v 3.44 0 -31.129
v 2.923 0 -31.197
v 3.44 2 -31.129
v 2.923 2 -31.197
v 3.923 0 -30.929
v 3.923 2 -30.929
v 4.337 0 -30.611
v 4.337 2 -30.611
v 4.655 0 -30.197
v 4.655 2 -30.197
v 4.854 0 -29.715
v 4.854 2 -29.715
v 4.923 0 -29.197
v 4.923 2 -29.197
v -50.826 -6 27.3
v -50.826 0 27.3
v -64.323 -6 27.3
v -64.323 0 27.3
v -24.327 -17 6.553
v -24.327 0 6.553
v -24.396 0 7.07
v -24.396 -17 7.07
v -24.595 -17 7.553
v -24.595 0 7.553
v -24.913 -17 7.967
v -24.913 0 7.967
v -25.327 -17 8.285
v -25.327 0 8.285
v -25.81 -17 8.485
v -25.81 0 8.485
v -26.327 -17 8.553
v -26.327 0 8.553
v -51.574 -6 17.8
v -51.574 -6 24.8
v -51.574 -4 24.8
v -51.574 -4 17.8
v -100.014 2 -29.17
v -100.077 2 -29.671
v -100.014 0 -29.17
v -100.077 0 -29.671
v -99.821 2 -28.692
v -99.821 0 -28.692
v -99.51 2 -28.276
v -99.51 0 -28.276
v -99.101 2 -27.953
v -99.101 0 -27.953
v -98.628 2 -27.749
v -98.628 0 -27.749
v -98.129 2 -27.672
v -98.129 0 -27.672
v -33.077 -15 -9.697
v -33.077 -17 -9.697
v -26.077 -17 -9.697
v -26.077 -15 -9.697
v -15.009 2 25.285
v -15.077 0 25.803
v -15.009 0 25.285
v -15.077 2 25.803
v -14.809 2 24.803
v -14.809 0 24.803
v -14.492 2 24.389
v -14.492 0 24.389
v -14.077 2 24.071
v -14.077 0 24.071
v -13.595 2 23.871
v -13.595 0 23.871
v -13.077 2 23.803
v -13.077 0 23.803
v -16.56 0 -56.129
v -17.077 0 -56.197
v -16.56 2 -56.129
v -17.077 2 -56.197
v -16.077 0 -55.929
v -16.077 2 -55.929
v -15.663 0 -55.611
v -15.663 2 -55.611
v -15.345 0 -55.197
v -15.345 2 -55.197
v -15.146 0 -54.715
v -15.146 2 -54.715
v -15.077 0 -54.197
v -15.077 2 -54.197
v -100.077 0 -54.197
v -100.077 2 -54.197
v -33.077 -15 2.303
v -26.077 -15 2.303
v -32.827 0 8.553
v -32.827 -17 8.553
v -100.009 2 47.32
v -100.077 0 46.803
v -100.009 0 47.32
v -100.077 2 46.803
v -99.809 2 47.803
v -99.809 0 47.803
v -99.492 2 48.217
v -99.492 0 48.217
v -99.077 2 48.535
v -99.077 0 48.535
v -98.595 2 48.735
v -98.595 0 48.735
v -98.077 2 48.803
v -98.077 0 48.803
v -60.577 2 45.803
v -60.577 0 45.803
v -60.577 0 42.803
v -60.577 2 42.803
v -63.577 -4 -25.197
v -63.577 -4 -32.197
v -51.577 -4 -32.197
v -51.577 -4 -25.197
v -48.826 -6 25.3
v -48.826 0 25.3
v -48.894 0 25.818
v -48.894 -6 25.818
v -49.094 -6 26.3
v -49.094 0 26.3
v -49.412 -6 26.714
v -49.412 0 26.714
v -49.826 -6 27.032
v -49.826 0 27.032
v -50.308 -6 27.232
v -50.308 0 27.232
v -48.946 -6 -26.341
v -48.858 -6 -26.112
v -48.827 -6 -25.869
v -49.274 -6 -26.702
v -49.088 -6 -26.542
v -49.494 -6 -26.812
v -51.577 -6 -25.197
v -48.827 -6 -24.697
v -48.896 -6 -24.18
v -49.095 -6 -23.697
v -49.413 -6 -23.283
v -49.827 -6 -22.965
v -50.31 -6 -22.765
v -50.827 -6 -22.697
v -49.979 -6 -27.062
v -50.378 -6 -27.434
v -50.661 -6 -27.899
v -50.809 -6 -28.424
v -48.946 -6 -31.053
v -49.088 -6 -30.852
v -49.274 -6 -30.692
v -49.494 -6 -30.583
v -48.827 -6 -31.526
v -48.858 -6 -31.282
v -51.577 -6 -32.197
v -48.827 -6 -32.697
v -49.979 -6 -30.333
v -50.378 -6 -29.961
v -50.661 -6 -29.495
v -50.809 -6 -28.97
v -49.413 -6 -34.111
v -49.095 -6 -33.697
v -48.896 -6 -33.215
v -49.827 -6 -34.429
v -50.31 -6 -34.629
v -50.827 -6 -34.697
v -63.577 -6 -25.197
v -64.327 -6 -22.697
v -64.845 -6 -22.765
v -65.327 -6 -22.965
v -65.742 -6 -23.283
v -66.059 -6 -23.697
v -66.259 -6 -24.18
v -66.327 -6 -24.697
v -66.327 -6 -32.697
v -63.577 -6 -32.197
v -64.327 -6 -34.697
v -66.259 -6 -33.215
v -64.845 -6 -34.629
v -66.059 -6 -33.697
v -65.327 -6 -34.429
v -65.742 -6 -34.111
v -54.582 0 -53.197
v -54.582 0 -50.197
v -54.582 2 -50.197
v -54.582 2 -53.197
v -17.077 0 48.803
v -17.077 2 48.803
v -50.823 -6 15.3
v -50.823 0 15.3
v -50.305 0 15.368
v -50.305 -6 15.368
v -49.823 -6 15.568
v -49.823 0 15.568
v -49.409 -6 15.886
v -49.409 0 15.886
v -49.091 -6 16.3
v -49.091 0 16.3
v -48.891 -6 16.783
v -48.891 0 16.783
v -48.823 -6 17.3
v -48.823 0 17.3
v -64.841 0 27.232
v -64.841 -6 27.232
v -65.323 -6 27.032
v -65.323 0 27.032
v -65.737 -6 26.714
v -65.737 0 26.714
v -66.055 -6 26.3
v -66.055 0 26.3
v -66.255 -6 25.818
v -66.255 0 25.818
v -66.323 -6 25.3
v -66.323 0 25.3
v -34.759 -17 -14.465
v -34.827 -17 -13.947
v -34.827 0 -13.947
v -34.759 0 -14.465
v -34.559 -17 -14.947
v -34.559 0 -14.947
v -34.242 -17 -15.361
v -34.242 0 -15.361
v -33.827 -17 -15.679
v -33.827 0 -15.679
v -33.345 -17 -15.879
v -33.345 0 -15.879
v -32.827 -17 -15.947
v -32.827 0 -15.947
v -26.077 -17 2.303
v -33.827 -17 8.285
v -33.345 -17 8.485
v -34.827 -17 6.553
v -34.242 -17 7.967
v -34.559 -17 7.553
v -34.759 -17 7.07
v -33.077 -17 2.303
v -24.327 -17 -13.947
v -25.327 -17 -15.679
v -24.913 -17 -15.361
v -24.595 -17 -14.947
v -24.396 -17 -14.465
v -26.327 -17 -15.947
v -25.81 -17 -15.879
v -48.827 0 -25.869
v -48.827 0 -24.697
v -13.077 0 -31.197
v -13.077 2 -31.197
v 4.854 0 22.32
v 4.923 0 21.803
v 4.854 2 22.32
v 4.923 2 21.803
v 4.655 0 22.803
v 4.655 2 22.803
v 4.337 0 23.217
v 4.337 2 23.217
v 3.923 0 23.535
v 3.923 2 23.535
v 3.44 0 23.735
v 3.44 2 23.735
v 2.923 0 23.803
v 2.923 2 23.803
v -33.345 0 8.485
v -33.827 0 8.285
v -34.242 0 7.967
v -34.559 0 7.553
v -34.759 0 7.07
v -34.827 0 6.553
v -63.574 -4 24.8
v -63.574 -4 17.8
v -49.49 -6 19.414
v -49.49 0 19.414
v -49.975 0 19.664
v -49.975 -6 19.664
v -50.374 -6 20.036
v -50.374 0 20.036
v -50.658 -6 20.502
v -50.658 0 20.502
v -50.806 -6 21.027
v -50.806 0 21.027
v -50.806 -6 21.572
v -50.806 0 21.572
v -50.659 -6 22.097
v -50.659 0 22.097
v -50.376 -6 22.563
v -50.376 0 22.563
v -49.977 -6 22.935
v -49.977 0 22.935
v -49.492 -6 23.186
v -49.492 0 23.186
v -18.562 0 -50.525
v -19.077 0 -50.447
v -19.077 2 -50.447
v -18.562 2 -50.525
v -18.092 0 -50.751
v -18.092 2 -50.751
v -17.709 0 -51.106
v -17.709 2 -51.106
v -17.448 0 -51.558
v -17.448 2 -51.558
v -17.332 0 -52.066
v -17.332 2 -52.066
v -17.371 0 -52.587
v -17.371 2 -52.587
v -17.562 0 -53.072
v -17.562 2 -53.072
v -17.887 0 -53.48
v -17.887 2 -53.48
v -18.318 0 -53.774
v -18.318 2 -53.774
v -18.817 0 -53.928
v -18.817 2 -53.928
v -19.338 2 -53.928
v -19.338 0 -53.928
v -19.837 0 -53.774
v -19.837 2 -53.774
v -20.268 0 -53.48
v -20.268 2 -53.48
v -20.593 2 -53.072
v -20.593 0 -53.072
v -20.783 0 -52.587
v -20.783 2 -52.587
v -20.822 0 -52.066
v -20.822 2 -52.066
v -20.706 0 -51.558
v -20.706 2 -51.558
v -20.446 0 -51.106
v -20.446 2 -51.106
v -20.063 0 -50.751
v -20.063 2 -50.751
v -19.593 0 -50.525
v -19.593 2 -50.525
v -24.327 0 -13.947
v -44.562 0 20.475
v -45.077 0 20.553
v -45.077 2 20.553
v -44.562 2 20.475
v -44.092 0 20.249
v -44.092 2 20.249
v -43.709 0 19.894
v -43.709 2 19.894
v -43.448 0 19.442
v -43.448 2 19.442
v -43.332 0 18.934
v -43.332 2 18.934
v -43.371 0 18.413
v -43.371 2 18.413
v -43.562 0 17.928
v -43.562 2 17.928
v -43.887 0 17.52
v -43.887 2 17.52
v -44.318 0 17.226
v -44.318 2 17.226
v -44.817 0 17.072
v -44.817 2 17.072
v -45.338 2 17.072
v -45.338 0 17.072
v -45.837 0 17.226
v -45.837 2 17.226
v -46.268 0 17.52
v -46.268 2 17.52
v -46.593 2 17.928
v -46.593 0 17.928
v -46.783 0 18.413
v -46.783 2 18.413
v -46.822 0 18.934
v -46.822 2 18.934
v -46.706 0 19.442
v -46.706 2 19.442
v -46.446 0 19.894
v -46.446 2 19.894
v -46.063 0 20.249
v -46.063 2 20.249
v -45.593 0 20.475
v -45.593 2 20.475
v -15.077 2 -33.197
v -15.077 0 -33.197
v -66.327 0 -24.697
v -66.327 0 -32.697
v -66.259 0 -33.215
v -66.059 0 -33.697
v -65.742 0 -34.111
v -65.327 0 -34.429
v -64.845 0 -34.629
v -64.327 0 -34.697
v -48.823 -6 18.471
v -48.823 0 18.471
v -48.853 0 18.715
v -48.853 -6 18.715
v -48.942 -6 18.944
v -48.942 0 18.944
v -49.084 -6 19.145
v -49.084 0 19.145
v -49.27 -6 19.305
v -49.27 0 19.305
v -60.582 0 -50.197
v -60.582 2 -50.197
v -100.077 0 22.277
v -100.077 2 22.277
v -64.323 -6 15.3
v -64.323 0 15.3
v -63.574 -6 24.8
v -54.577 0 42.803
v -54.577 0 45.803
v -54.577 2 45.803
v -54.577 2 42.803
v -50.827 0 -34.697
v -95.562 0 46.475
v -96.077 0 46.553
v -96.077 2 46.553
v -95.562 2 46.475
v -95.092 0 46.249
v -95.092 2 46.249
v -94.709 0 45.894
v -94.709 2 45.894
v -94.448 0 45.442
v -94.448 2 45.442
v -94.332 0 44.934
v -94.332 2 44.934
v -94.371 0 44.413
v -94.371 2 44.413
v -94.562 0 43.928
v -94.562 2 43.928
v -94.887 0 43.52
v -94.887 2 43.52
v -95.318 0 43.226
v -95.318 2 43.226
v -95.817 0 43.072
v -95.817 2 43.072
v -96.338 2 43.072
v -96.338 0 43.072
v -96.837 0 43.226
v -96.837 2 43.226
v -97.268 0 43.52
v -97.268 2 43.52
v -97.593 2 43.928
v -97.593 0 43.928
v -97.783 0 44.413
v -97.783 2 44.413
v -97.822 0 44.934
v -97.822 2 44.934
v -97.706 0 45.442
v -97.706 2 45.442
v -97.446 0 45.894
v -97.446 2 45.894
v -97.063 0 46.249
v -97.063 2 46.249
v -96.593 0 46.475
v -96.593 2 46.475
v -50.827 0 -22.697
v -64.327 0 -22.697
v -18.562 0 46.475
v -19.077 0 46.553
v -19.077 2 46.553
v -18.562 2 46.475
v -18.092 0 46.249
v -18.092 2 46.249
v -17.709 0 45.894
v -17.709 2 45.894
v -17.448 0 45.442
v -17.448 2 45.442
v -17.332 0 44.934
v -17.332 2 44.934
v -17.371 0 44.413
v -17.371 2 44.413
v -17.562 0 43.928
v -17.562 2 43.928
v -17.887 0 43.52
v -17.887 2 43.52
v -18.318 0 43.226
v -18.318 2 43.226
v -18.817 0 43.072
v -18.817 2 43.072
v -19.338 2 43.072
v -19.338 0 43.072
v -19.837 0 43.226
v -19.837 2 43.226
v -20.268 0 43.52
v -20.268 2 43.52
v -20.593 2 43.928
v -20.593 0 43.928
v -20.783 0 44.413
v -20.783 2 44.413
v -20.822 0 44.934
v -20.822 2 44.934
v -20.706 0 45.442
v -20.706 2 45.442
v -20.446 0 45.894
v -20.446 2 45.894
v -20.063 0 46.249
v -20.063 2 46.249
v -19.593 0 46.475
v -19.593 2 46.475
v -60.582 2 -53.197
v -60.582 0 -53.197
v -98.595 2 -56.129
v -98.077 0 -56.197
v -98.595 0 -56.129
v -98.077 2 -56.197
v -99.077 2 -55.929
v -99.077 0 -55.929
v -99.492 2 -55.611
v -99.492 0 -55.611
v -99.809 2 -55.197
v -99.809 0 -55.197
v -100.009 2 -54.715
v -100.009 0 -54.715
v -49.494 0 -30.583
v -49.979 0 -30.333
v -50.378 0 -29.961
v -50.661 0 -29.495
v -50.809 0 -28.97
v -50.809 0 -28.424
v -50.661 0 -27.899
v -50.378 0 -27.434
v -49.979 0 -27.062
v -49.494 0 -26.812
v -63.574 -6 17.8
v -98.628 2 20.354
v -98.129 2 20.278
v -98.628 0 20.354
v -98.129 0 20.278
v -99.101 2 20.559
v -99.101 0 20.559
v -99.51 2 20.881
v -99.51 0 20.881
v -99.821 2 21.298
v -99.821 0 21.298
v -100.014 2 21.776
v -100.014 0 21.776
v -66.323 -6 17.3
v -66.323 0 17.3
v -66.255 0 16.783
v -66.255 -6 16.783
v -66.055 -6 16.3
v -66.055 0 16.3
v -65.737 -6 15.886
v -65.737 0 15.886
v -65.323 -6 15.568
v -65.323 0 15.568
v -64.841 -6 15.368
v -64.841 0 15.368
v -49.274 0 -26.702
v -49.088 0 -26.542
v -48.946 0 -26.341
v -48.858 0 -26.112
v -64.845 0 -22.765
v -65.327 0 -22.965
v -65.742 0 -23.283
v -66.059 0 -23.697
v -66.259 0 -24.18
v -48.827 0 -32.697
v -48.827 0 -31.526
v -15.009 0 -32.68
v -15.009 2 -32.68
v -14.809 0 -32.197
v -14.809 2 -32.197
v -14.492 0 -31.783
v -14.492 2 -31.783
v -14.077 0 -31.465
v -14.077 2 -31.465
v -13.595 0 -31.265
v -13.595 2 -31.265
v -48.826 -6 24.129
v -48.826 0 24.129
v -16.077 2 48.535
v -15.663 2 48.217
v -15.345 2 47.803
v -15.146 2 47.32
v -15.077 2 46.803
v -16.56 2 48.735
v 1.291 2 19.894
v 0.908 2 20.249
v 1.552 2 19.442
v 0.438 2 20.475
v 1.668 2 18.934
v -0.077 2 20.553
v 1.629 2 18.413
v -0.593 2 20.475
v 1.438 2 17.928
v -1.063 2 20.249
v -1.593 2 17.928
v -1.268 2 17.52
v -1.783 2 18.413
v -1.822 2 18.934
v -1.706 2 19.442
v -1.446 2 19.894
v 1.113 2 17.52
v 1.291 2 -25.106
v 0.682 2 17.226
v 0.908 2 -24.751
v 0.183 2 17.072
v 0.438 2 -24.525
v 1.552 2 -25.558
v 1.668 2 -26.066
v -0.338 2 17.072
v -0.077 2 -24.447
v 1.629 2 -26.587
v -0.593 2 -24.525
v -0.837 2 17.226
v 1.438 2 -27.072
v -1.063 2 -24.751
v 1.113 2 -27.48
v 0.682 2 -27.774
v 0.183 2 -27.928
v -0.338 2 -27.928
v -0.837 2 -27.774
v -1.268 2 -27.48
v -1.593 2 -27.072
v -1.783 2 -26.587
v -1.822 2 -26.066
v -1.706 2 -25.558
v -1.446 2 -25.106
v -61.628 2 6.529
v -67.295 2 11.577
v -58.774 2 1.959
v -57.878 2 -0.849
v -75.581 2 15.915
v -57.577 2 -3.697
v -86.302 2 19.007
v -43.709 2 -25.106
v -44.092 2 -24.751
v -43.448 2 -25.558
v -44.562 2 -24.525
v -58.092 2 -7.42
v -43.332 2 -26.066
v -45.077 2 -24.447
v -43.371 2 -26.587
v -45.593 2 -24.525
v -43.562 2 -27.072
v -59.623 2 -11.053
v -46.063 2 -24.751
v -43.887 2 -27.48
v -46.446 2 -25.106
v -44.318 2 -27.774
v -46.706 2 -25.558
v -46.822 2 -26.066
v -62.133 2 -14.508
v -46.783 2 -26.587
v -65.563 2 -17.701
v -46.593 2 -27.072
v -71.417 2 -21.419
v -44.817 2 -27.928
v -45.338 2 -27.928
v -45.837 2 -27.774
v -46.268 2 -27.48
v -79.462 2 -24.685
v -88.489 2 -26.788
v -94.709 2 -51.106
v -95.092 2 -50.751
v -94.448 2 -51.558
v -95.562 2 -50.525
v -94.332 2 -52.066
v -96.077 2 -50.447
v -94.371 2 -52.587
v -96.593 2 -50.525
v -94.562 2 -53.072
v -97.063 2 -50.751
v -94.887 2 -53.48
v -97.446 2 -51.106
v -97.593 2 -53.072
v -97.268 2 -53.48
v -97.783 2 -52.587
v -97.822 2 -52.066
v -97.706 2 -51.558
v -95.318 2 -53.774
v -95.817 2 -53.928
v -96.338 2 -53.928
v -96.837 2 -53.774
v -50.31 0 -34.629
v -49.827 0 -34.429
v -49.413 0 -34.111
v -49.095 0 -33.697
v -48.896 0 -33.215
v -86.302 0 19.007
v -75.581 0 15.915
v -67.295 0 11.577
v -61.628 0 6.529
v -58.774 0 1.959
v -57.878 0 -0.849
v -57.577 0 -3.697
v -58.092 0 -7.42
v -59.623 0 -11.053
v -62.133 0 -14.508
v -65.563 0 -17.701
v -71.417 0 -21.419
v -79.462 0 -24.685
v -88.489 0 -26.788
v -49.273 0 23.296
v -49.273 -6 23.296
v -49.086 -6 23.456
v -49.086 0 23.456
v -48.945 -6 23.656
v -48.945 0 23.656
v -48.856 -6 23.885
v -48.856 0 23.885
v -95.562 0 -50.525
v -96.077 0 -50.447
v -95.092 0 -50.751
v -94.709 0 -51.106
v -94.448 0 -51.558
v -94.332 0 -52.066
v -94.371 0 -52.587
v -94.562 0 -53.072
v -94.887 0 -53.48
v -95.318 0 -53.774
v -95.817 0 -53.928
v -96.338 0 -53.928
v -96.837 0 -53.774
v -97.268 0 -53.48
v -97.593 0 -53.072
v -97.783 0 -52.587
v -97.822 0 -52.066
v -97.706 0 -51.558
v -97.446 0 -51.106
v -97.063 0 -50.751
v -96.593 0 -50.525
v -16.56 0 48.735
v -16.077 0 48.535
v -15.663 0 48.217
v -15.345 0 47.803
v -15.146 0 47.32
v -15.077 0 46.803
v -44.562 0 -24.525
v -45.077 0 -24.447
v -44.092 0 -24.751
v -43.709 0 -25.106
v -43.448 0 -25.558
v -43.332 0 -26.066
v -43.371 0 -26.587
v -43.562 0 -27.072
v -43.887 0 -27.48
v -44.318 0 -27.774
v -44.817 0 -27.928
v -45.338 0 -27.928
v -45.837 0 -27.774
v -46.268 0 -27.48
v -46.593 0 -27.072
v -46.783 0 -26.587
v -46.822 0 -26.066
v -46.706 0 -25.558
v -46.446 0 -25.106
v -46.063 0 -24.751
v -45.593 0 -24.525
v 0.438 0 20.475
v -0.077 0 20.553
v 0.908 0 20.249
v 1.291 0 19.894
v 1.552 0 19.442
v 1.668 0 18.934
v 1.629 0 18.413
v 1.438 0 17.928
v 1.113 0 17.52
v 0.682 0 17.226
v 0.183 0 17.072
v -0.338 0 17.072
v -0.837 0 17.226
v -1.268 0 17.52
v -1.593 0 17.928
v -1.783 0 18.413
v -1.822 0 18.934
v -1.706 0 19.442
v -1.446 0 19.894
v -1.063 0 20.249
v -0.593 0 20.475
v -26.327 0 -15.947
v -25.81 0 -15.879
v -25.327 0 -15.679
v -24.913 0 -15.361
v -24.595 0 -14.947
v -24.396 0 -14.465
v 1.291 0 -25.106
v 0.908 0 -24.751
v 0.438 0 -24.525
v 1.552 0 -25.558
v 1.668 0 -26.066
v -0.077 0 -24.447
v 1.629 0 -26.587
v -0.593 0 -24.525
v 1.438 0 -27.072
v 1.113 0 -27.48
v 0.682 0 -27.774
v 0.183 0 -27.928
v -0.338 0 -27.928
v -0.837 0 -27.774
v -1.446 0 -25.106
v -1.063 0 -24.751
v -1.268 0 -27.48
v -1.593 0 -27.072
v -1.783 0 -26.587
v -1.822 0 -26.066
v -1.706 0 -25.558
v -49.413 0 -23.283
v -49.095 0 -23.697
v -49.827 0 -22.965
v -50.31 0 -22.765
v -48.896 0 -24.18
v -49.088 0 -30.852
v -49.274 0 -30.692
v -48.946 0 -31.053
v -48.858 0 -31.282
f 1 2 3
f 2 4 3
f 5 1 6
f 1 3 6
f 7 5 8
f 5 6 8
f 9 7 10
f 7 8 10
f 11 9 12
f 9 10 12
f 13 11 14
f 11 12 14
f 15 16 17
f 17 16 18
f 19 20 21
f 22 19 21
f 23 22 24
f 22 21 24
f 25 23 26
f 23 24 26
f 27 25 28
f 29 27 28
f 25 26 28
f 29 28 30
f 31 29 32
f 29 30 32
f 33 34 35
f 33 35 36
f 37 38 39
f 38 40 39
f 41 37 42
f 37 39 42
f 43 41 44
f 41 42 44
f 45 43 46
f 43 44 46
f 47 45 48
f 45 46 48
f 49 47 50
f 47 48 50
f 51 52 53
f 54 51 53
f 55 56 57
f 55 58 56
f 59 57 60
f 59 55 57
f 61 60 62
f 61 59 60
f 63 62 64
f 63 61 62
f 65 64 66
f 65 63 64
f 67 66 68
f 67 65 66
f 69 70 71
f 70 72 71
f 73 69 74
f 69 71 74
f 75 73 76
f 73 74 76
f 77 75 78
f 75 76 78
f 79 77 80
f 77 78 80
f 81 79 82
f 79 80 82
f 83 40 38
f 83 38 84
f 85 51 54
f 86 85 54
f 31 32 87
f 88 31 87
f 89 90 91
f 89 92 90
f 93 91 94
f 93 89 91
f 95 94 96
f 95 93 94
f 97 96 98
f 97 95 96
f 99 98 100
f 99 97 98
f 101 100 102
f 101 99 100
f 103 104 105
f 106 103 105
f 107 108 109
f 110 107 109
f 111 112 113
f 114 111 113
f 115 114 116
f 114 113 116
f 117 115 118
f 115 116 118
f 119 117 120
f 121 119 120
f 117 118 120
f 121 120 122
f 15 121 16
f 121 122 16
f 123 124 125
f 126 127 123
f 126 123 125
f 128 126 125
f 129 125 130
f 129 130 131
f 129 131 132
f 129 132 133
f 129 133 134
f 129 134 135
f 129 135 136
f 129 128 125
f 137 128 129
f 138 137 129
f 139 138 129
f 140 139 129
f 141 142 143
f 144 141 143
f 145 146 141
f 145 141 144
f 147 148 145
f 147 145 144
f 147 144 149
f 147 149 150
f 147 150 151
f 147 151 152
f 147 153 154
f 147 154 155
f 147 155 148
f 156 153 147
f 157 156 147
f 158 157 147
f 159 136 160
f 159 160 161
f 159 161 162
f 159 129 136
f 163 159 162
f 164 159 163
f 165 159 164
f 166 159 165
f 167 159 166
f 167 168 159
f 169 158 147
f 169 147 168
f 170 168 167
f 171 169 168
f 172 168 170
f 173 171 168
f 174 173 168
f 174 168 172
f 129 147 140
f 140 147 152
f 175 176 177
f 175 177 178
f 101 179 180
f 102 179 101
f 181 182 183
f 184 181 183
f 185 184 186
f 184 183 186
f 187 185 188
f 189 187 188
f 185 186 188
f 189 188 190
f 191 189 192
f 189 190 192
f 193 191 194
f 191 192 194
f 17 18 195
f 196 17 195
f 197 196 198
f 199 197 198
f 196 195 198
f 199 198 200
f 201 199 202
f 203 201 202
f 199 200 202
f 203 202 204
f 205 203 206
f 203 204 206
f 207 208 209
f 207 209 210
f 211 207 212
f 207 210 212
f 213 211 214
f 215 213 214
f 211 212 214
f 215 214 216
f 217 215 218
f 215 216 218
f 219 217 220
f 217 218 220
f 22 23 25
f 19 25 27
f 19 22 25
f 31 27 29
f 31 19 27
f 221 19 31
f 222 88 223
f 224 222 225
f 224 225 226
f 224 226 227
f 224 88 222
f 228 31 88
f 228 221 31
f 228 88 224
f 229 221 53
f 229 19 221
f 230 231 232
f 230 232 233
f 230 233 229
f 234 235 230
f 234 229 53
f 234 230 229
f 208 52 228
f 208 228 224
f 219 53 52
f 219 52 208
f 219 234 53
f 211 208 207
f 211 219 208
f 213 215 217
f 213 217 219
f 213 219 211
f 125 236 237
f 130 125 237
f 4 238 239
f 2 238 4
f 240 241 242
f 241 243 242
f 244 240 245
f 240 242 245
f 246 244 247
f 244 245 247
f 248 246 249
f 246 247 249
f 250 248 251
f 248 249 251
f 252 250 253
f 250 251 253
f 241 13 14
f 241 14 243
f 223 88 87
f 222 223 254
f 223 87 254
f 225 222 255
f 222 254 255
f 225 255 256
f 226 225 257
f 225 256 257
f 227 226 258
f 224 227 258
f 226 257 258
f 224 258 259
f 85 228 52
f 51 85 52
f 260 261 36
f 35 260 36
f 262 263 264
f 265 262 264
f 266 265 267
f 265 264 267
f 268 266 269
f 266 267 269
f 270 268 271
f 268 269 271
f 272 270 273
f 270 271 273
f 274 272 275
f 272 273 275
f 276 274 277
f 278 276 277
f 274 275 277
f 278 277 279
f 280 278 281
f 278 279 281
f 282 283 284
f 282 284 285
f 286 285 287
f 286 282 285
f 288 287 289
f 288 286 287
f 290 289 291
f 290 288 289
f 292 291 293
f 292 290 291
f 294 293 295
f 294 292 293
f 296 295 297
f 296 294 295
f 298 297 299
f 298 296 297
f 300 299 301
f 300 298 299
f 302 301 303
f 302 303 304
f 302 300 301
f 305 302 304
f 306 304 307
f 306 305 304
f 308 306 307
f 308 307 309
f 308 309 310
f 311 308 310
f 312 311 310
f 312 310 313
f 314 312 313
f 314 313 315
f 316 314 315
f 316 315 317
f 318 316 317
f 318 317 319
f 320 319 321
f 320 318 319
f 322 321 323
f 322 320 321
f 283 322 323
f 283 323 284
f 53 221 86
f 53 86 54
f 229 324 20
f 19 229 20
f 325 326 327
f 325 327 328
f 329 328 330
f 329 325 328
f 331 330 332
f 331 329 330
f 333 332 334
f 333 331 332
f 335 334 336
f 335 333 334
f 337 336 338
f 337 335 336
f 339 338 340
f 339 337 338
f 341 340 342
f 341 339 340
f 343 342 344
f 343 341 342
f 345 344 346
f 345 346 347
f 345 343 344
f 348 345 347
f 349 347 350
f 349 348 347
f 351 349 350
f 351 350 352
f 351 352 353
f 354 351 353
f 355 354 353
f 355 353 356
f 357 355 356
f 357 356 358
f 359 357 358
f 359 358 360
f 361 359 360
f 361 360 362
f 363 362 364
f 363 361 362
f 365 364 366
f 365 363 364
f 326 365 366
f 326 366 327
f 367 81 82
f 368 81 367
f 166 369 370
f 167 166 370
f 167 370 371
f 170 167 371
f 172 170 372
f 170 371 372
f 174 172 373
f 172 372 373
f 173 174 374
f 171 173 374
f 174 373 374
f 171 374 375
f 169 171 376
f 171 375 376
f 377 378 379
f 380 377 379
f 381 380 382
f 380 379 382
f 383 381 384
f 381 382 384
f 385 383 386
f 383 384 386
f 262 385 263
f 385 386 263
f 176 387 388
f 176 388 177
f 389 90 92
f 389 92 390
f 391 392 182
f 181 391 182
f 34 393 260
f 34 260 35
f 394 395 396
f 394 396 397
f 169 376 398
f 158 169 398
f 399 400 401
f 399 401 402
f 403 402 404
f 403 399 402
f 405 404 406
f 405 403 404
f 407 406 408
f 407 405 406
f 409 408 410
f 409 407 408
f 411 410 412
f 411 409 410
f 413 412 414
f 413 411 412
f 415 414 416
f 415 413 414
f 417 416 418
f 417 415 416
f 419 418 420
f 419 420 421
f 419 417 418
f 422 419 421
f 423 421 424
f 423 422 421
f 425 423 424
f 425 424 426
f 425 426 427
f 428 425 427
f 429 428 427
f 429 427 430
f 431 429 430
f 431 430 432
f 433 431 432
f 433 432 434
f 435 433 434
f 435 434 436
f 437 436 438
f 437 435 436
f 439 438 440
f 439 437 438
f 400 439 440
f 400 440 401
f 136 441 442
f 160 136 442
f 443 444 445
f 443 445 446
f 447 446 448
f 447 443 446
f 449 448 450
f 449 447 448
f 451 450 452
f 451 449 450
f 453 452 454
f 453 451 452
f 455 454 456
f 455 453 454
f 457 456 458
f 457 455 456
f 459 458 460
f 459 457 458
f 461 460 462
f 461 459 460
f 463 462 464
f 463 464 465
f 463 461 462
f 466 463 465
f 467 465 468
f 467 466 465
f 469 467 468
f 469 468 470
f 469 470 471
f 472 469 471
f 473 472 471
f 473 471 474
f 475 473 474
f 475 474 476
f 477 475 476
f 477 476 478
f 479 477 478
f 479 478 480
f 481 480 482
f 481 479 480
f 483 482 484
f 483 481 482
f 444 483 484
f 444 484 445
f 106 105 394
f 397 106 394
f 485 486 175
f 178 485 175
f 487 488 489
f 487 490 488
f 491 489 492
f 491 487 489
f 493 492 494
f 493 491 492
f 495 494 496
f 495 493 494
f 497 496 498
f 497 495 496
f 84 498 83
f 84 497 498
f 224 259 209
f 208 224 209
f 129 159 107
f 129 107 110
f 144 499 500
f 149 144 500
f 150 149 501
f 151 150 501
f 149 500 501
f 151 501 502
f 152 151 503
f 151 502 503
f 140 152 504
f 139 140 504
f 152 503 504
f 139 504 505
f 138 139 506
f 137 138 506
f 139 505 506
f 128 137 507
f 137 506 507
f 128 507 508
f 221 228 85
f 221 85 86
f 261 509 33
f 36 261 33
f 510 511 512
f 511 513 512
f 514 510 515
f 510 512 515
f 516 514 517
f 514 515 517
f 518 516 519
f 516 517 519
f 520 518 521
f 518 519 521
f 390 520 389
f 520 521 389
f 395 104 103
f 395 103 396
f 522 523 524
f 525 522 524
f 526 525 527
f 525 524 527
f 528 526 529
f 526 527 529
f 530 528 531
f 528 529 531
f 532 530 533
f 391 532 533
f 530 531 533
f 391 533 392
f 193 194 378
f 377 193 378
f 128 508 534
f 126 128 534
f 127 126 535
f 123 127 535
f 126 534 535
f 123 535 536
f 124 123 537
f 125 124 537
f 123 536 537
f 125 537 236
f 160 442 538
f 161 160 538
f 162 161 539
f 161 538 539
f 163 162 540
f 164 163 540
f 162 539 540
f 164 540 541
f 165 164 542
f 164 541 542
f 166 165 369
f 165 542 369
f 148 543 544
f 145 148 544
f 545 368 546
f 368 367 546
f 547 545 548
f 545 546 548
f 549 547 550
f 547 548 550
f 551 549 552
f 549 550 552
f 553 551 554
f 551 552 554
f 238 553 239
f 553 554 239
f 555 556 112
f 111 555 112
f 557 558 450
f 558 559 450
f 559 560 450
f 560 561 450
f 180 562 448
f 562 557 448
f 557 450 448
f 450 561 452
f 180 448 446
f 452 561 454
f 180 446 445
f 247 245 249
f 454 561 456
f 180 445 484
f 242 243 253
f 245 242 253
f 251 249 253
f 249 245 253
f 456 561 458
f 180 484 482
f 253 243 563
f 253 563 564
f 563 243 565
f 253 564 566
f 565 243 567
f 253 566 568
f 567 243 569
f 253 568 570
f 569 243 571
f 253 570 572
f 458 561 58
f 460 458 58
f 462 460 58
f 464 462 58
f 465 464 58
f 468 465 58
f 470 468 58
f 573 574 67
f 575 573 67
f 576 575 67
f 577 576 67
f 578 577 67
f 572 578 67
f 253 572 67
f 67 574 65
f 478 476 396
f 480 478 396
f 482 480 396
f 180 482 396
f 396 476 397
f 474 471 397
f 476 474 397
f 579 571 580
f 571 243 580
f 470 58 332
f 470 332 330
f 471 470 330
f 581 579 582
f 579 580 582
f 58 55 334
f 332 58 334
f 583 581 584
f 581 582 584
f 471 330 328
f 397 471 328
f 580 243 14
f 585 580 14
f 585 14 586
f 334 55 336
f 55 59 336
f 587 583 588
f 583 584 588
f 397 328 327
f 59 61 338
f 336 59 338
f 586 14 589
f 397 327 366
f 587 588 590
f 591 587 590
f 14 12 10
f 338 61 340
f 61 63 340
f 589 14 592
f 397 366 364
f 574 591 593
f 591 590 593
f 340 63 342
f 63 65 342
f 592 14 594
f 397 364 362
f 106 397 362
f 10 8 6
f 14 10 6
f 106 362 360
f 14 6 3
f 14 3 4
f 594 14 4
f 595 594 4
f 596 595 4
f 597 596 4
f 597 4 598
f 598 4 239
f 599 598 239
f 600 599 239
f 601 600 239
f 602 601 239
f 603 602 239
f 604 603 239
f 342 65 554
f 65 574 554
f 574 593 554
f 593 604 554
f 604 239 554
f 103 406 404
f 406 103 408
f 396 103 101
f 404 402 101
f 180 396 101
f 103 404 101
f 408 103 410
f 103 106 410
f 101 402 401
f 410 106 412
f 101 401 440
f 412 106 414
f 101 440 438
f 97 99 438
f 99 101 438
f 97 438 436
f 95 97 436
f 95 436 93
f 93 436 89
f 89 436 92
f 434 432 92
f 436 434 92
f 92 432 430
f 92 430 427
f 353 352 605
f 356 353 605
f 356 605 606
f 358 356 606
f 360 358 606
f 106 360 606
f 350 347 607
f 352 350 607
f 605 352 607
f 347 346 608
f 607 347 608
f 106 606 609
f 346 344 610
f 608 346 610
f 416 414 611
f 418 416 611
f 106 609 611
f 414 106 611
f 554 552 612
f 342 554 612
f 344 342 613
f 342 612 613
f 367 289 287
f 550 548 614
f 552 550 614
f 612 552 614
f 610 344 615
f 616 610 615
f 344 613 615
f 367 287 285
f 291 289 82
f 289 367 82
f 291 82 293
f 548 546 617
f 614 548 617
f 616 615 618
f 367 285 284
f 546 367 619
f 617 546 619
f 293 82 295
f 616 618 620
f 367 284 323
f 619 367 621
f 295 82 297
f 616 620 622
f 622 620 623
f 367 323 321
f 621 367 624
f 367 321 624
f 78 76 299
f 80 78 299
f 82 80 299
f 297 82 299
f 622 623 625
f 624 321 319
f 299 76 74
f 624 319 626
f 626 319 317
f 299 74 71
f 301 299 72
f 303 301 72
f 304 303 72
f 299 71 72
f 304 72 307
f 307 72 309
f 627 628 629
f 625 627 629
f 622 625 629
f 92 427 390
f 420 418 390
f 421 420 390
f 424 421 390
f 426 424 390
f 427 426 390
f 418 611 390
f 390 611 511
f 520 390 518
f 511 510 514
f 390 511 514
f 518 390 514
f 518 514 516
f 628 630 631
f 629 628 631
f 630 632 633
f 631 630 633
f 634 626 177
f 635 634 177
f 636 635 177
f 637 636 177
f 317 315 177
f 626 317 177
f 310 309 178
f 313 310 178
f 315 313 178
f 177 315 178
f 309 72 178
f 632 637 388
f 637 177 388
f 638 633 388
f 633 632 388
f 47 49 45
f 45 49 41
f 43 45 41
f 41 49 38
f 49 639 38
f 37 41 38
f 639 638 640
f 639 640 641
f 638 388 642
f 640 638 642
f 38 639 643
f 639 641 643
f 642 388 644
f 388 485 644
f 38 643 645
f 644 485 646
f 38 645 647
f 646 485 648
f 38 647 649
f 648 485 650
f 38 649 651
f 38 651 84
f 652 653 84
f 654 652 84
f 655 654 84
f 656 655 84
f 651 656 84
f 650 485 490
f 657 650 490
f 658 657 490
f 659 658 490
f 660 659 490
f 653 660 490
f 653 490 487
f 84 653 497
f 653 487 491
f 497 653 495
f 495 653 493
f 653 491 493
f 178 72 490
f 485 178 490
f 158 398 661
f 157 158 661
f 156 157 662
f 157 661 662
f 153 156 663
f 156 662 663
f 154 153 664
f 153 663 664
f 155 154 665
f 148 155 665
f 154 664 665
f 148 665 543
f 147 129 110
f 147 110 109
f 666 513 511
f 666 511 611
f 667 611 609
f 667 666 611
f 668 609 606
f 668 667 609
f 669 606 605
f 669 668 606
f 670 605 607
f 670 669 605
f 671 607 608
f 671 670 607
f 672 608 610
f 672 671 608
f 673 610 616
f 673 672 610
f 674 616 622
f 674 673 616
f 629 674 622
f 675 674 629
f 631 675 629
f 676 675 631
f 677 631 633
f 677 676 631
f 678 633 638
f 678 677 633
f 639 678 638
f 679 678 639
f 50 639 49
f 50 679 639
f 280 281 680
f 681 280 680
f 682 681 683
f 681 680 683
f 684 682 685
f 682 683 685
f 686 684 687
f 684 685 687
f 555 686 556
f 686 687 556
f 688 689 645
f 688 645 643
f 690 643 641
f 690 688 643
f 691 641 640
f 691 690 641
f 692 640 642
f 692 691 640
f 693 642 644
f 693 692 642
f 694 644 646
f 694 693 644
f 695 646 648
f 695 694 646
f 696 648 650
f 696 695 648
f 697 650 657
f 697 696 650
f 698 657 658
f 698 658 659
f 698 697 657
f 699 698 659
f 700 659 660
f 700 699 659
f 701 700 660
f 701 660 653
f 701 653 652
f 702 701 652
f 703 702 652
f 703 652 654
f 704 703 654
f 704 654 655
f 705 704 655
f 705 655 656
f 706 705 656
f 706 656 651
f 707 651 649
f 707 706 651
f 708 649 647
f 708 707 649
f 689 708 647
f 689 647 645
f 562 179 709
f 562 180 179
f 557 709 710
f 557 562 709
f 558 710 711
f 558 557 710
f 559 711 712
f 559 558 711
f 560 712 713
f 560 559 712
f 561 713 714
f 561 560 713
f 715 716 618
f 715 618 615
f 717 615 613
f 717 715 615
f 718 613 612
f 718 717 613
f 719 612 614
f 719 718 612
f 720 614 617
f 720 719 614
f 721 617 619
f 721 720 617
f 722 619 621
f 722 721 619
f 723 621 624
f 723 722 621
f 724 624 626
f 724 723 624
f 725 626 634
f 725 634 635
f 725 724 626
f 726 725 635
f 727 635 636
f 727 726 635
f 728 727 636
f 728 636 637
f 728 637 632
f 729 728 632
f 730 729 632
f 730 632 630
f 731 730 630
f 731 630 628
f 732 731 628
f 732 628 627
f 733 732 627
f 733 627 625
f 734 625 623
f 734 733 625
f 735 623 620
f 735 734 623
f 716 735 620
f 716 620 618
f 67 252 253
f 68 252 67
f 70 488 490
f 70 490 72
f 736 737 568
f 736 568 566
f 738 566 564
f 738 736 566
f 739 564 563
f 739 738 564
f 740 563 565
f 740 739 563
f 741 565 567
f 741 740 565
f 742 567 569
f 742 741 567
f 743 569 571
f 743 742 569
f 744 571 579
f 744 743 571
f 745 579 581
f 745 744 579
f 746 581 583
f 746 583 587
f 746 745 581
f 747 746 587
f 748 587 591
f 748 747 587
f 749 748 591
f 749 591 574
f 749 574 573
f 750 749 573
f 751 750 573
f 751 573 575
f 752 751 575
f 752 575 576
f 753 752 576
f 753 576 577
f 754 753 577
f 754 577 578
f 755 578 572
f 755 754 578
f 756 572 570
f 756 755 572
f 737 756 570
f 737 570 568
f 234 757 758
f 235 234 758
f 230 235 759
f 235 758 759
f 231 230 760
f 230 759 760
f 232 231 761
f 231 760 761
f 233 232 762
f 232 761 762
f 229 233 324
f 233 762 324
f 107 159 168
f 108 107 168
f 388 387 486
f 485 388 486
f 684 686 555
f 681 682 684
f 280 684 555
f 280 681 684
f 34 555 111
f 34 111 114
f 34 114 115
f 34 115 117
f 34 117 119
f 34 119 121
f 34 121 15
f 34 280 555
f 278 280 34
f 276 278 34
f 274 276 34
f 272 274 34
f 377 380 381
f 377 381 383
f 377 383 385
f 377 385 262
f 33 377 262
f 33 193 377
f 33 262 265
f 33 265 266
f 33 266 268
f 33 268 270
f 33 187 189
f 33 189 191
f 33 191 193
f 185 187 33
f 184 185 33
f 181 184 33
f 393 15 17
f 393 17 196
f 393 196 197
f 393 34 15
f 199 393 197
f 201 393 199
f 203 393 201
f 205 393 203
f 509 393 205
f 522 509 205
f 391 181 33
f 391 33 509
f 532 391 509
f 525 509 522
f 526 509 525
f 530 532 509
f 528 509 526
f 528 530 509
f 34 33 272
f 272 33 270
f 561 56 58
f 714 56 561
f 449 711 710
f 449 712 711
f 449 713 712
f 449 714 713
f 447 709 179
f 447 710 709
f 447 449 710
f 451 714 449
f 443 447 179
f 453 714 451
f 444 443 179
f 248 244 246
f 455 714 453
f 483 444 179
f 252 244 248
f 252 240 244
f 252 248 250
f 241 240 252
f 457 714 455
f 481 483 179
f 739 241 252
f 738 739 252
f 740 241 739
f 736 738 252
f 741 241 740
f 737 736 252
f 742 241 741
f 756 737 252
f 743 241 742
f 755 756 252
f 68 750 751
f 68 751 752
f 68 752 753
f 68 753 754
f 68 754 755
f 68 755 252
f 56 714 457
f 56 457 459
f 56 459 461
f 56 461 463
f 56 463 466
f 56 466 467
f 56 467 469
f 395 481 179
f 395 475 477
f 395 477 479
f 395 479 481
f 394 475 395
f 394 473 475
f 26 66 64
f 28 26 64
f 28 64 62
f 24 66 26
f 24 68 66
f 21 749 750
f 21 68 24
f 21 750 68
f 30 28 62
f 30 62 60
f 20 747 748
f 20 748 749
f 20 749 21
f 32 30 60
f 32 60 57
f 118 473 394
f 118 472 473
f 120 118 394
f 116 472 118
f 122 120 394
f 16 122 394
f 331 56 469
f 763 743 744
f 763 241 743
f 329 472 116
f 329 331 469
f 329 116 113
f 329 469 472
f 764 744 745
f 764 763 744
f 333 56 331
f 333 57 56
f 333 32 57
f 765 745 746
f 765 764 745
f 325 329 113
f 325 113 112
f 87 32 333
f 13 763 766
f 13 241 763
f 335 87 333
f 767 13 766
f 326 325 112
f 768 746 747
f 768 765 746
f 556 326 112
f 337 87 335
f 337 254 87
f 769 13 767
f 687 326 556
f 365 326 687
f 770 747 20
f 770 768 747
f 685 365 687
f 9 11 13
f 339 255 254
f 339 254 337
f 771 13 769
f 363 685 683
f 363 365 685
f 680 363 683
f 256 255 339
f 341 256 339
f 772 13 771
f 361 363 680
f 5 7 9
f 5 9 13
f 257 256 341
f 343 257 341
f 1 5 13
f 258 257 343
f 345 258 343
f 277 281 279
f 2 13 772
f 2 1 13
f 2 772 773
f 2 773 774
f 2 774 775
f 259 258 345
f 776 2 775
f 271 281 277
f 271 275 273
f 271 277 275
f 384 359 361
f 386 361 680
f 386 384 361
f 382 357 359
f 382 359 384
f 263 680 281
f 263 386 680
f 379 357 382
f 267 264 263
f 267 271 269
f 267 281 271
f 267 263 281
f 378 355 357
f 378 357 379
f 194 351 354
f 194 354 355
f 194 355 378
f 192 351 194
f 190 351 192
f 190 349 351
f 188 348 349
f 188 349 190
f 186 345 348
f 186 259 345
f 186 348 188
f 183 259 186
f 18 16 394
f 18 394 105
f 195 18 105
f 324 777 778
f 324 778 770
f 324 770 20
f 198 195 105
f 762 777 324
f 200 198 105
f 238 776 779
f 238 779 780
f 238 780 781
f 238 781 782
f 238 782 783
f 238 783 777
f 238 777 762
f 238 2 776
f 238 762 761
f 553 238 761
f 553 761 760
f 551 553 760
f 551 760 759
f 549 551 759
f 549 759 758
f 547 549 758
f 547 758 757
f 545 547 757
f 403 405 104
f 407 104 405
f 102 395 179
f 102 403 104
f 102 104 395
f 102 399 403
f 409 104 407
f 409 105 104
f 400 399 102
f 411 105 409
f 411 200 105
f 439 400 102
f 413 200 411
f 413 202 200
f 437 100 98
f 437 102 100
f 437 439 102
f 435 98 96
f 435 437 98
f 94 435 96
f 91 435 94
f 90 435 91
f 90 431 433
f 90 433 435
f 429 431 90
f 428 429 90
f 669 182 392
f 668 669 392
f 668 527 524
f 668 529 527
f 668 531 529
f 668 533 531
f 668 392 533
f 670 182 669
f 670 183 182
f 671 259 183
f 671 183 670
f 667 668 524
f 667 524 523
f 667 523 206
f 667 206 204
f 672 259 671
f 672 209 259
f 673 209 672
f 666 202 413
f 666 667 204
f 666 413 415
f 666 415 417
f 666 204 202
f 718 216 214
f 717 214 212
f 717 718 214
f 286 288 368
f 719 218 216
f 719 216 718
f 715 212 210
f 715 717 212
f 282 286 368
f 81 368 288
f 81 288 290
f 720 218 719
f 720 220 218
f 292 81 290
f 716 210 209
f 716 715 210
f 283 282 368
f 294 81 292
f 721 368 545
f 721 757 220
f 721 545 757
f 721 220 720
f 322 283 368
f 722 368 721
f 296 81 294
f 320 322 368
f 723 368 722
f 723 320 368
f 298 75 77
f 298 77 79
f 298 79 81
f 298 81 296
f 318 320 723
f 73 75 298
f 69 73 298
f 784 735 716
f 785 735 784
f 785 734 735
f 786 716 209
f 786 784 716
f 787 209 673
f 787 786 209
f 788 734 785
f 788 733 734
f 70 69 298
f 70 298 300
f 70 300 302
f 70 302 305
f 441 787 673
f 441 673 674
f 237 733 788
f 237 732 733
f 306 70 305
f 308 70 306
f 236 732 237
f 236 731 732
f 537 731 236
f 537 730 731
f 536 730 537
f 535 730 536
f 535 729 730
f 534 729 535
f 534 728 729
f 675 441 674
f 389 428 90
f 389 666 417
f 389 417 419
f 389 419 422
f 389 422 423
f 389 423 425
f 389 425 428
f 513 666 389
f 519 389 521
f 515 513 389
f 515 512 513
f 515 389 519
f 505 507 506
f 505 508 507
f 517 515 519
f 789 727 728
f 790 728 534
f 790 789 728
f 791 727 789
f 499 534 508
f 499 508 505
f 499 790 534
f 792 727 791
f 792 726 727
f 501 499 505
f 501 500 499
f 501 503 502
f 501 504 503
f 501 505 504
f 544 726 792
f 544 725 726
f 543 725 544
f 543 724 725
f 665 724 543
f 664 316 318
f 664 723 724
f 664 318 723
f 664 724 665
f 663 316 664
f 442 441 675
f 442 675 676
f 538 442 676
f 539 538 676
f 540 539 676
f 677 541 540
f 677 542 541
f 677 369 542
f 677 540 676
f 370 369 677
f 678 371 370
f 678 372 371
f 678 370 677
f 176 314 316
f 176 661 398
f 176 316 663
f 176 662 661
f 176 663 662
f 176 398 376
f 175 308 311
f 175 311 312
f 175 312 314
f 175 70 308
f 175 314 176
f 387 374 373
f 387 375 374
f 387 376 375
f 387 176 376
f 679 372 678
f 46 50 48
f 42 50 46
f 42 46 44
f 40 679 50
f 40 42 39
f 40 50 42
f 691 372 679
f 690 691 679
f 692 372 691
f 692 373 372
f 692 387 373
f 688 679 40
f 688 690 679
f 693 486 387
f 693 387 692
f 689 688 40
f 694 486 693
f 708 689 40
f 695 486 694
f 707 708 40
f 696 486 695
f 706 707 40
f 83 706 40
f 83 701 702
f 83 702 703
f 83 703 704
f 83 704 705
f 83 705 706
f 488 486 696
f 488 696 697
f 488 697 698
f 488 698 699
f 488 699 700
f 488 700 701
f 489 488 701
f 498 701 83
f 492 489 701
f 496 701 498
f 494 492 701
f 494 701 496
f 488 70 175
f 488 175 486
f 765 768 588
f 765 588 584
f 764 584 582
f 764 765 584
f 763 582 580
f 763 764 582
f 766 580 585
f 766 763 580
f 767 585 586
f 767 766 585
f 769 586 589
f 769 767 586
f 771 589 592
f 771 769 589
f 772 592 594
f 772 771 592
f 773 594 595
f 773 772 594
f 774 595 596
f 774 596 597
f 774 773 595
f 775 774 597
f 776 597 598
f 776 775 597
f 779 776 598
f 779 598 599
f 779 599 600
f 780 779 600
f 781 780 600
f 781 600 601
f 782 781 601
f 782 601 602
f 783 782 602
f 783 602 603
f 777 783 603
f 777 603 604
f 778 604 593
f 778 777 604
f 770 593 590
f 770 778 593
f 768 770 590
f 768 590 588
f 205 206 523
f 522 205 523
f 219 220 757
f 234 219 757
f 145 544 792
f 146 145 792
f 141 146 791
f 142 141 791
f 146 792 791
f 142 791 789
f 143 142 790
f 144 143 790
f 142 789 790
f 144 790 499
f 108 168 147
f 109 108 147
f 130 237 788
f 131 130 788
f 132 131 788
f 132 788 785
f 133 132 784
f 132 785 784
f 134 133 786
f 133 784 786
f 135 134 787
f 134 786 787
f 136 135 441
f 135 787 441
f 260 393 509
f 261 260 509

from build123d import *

# Parameters (mm, degrees)
SKETCH1_R           = 1.75
SKETCH1_W           = 6
SKETCH1_H           = 3
BOSS_EXTRUDE1_DEPTH = 2
BOSS_EXTRUDE2_DEPTH = 6
SKETCH4_RX          = 42.5
SKETCH4_RY          = 24
CUT_EXTRUDE1_DEPTH  = 2
BOSS_EXTRUDE3_DEPTH = 17
FILLET1_R           = 2
CUT_EXTRUDE2_START  = -6
SKETCH2_3_W         = 12
SKETCH2_3_H         = 7
CUT_EXTRUDE2_DEPTH  = 2
CUT_EXTRUDE3_START  = -17
SKETCH3_3_W         = 7
SKETCH3_3_H         = 12
CUT_EXTRUDE3_DEPTH  = 2


with BuildPart() as part:
    # Sketch1 → Boss-Extrude1 (new body)
    with BuildSketch(Plane(origin=(0, 0, 0), x_dir=(1, 0, 0), z_dir=(0, 1, 0))):
        Polygon((-100.077357964, 56.197183099), (-15.077357964, 56.197183099), (-15.077357964, 31.197183099), (4.922642036, 31.197183099), (4.922642036, -23.802816901), (-15.077357964, -23.802816901), (-15.077357964, -48.802816901), (-100.077357964, -48.802816901), align=None)
        with Locations(Location((-96.077357964, 52.197183099, 0), (0, 0, 270))):  # turned: the seam where the file's is
            Circle(SKETCH1_R, mode=Mode.SUBTRACT)
        with Locations(Location((-96.077357964, -44.802816901, 0), (0, 0, 270))):  # turned: the seam where the file's is
            Circle(SKETCH1_R, mode=Mode.SUBTRACT)
        with Locations(Location((-19.077357964, -44.802816901, 0), (0, 0, 270))):  # turned: the seam where the file's is
            Circle(SKETCH1_R, mode=Mode.SUBTRACT)
        with Locations(Location((-19.077357964, 52.197183099, 0), (0, 0, 270))):  # turned: the seam where the file's is
            Circle(SKETCH1_R, mode=Mode.SUBTRACT)
        with Locations(Location((-0.077357964, 26.197183099, 0), (0, 0, 270))):  # turned: the seam where the file's is
            Circle(SKETCH1_R, mode=Mode.SUBTRACT)
        with Locations(Location((-0.077357964, -18.802816901, 0), (0, 0, 270))):  # turned: the seam where the file's is
            Circle(SKETCH1_R, mode=Mode.SUBTRACT)
        with Locations(Location((-45.077357964, 26.197183099, 0), (0, 0, 270))):  # turned: the seam where the file's is
            Circle(SKETCH1_R, mode=Mode.SUBTRACT)
        with Locations(Location((-45.077357964, -18.802816901, 0), (0, 0, 270))):  # turned: the seam where the file's is
            Circle(SKETCH1_R, mode=Mode.SUBTRACT)
        with Locations((-57.581758556, 51.697183099)):
            Rectangle(SKETCH1_W, SKETCH1_H, mode=Mode.SUBTRACT)
        with Locations((-57.577357964, -44.302816901)):
            Rectangle(SKETCH1_W, SKETCH1_H, mode=Mode.SUBTRACT)
    extrude(amount=BOSS_EXTRUDE1_DEPTH)

    # Sketch2 → Boss-Extrude2 (add)
    with BuildSketch(Plane(origin=(0, 0, 0), x_dir=(1, 0, 0), z_dir=(0, 1, 0))):
        with BuildLine():
            Line((-48.827357964, 32.697183099), (-48.827357964, 31.525610223))
            ThreePointArc((-48.827357964, 31.525610223), (-49.010861383, 30.948259954), (-49.494024631, 30.582801182))
            ThreePointArc((-49.494024631, 30.582801182), (-50.827357964, 28.697183099), (-49.494024631, 26.811565015))
            ThreePointArc((-49.494024631, 26.811565015), (-49.010861383, 26.446106243), (-48.827357964, 25.868755974))
            Line((-48.827357964, 25.868755974), (-48.827357964, 24.697183099))
            ThreePointArc((-48.827357964, 24.697183099), (-49.413144402, 23.282969536), (-50.827357964, 22.697183099))
            Line((-50.827357964, 22.697183099), (-64.327357964, 22.697183099))
            ThreePointArc((-64.327357964, 22.697183099), (-65.741571527, 23.282969536), (-66.327357964, 24.697183099))
            Line((-66.327357964, 24.697183099), (-66.327357964, 32.697183099))
            ThreePointArc((-66.327357964, 32.697183099), (-65.741571527, 34.111396661), (-64.327357964, 34.697183099))
            Line((-64.327357964, 34.697183099), (-50.827357964, 34.697183099))
            ThreePointArc((-50.827357964, 34.697183099), (-49.413144402, 34.111396661), (-48.827357964, 32.697183099))
        make_face()
        with BuildLine():
            Line((-48.822971012, -17.300189586), (-48.822971012, -18.471355074))
            ThreePointArc((-48.822971012, -18.471355074), (-49.00663465, -19.04893186), (-49.4901609, -19.414348939))
            ThreePointArc((-49.4901609, -19.414348939), (-50.8246687, -21.299453668), (-49.492167868, -23.185977571))
            ThreePointArc((-49.492167868, -23.185977571), (-49.009337779, -23.551474397), (-48.825981367, -24.128616711))
            Line((-48.825981367, -24.128616711), (-48.825981367, -25.300189586))
            ThreePointArc((-48.825981367, -25.300189586), (-49.411767805, -26.714403149), (-50.825981367, -27.300189586))
            Line((-50.825981367, -27.300189586), (-64.322971012, -27.300189586))
            ThreePointArc((-64.322971012, -27.300189586), (-65.737184574, -26.714403149), (-66.322971012, -25.300189586))
            Line((-66.322971012, -25.300189586), (-66.322971012, -17.300189586))
            ThreePointArc((-66.322971012, -17.300189586), (-65.737184574, -15.885976024), (-64.322971012, -15.300189586))
            Line((-64.322971012, -15.300189586), (-50.822971012, -15.300189586))
            ThreePointArc((-50.822971012, -15.300189586), (-49.408757449, -15.885976024), (-48.822971012, -17.300189586))
        make_face()
    extrude(amount=-BOSS_EXTRUDE2_DEPTH)

    # Sketch4 → Cut-Extrude1 (cut)
    with BuildSketch(Plane(origin=(0, 0, 0), x_dir=(1, 0, 0), z_dir=(0, 1, 0))):
        with Locations(Location((-100.077357964, 3.697183099), (0, 0, 0))):
            Ellipse(SKETCH4_RX, SKETCH4_RY)
    extrude(amount=CUT_EXTRUDE1_DEPTH, mode=Mode.SUBTRACT)

    # Sketch3 → Boss-Extrude3 (add)
    with BuildSketch(Plane(origin=(0, 0, 0), x_dir=(1, 0, 0), z_dir=(0, 1, 0))):
        with BuildLine():
            Line((-32.827357964, 15.947183099), (-26.327357964, 15.947183099))
            ThreePointArc((-26.327357964, 15.947183099), (-24.913144402, 15.361396661), (-24.327357964, 13.947183099))
            Line((-24.327357964, 13.947183099), (-24.327357964, -6.552816901))
            ThreePointArc((-24.327357964, -6.552816901), (-24.913144402, -7.967030464), (-26.327357964, -8.552816901))
            Line((-26.327357964, -8.552816901), (-32.827357964, -8.552816901))
            ThreePointArc((-32.827357964, -8.552816901), (-34.241571527, -7.967030464), (-34.827357964, -6.552816901))
            Line((-34.827357964, -6.552816901), (-34.827357964, 13.947183099))
            ThreePointArc((-34.827357964, 13.947183099), (-34.241571527, 15.361396661), (-32.827357964, 15.947183099))
        make_face()
    extrude(amount=-BOSS_EXTRUDE3_DEPTH)

    # Fillet1
    fillet1_edges = [part.edges().sort_by_distance(p)[0] for p in [
        (-100.077357964, 1, -56.197183099),
        (-100.077357964, 1, -27.697183099),
        (-100.077357964, 1, 20.302816901),
        (-100.077357964, 1, 48.802816901),
        (-15.077357964, 1, 48.802816901),
        (-15.077357964, 1, 23.802816901),
        (4.922642036, 1, 23.802816901),
        (4.922642036, 1, -31.197183099),
        (-15.077357964, 1, -31.197183099),
        (-15.077357964, 1, -56.197183099),
    ]]
    fillet(fillet1_edges, radius=FILLET1_R)

    # Sketch2_3 → Cut-Extrude2 (cut)
    with BuildSketch(Plane(origin=(0, 0, 0), x_dir=(1, 0, 0), z_dir=(0, 1, 0)).offset(CUT_EXTRUDE2_START)):
        with Locations((-57.577357964, 28.697183099)):
            Rectangle(SKETCH2_3_W, SKETCH2_3_H)
        with Locations((-57.574476189, -21.300189586)):
            Rectangle(SKETCH2_3_W, SKETCH2_3_H)
    extrude(amount=CUT_EXTRUDE2_DEPTH, mode=Mode.SUBTRACT)

    # Sketch3_3 → Cut-Extrude3 (cut)
    with BuildSketch(Plane(origin=(0, 0, 0), x_dir=(1, 0, 0), z_dir=(0, 1, 0)).offset(CUT_EXTRUDE3_START)):
        with Locations((-29.577357964, 3.697183099)):
            Rectangle(SKETCH3_3_W, SKETCH3_3_H)
    extrude(amount=CUT_EXTRUDE3_DEPTH, mode=Mode.SUBTRACT)


solid = part.part
